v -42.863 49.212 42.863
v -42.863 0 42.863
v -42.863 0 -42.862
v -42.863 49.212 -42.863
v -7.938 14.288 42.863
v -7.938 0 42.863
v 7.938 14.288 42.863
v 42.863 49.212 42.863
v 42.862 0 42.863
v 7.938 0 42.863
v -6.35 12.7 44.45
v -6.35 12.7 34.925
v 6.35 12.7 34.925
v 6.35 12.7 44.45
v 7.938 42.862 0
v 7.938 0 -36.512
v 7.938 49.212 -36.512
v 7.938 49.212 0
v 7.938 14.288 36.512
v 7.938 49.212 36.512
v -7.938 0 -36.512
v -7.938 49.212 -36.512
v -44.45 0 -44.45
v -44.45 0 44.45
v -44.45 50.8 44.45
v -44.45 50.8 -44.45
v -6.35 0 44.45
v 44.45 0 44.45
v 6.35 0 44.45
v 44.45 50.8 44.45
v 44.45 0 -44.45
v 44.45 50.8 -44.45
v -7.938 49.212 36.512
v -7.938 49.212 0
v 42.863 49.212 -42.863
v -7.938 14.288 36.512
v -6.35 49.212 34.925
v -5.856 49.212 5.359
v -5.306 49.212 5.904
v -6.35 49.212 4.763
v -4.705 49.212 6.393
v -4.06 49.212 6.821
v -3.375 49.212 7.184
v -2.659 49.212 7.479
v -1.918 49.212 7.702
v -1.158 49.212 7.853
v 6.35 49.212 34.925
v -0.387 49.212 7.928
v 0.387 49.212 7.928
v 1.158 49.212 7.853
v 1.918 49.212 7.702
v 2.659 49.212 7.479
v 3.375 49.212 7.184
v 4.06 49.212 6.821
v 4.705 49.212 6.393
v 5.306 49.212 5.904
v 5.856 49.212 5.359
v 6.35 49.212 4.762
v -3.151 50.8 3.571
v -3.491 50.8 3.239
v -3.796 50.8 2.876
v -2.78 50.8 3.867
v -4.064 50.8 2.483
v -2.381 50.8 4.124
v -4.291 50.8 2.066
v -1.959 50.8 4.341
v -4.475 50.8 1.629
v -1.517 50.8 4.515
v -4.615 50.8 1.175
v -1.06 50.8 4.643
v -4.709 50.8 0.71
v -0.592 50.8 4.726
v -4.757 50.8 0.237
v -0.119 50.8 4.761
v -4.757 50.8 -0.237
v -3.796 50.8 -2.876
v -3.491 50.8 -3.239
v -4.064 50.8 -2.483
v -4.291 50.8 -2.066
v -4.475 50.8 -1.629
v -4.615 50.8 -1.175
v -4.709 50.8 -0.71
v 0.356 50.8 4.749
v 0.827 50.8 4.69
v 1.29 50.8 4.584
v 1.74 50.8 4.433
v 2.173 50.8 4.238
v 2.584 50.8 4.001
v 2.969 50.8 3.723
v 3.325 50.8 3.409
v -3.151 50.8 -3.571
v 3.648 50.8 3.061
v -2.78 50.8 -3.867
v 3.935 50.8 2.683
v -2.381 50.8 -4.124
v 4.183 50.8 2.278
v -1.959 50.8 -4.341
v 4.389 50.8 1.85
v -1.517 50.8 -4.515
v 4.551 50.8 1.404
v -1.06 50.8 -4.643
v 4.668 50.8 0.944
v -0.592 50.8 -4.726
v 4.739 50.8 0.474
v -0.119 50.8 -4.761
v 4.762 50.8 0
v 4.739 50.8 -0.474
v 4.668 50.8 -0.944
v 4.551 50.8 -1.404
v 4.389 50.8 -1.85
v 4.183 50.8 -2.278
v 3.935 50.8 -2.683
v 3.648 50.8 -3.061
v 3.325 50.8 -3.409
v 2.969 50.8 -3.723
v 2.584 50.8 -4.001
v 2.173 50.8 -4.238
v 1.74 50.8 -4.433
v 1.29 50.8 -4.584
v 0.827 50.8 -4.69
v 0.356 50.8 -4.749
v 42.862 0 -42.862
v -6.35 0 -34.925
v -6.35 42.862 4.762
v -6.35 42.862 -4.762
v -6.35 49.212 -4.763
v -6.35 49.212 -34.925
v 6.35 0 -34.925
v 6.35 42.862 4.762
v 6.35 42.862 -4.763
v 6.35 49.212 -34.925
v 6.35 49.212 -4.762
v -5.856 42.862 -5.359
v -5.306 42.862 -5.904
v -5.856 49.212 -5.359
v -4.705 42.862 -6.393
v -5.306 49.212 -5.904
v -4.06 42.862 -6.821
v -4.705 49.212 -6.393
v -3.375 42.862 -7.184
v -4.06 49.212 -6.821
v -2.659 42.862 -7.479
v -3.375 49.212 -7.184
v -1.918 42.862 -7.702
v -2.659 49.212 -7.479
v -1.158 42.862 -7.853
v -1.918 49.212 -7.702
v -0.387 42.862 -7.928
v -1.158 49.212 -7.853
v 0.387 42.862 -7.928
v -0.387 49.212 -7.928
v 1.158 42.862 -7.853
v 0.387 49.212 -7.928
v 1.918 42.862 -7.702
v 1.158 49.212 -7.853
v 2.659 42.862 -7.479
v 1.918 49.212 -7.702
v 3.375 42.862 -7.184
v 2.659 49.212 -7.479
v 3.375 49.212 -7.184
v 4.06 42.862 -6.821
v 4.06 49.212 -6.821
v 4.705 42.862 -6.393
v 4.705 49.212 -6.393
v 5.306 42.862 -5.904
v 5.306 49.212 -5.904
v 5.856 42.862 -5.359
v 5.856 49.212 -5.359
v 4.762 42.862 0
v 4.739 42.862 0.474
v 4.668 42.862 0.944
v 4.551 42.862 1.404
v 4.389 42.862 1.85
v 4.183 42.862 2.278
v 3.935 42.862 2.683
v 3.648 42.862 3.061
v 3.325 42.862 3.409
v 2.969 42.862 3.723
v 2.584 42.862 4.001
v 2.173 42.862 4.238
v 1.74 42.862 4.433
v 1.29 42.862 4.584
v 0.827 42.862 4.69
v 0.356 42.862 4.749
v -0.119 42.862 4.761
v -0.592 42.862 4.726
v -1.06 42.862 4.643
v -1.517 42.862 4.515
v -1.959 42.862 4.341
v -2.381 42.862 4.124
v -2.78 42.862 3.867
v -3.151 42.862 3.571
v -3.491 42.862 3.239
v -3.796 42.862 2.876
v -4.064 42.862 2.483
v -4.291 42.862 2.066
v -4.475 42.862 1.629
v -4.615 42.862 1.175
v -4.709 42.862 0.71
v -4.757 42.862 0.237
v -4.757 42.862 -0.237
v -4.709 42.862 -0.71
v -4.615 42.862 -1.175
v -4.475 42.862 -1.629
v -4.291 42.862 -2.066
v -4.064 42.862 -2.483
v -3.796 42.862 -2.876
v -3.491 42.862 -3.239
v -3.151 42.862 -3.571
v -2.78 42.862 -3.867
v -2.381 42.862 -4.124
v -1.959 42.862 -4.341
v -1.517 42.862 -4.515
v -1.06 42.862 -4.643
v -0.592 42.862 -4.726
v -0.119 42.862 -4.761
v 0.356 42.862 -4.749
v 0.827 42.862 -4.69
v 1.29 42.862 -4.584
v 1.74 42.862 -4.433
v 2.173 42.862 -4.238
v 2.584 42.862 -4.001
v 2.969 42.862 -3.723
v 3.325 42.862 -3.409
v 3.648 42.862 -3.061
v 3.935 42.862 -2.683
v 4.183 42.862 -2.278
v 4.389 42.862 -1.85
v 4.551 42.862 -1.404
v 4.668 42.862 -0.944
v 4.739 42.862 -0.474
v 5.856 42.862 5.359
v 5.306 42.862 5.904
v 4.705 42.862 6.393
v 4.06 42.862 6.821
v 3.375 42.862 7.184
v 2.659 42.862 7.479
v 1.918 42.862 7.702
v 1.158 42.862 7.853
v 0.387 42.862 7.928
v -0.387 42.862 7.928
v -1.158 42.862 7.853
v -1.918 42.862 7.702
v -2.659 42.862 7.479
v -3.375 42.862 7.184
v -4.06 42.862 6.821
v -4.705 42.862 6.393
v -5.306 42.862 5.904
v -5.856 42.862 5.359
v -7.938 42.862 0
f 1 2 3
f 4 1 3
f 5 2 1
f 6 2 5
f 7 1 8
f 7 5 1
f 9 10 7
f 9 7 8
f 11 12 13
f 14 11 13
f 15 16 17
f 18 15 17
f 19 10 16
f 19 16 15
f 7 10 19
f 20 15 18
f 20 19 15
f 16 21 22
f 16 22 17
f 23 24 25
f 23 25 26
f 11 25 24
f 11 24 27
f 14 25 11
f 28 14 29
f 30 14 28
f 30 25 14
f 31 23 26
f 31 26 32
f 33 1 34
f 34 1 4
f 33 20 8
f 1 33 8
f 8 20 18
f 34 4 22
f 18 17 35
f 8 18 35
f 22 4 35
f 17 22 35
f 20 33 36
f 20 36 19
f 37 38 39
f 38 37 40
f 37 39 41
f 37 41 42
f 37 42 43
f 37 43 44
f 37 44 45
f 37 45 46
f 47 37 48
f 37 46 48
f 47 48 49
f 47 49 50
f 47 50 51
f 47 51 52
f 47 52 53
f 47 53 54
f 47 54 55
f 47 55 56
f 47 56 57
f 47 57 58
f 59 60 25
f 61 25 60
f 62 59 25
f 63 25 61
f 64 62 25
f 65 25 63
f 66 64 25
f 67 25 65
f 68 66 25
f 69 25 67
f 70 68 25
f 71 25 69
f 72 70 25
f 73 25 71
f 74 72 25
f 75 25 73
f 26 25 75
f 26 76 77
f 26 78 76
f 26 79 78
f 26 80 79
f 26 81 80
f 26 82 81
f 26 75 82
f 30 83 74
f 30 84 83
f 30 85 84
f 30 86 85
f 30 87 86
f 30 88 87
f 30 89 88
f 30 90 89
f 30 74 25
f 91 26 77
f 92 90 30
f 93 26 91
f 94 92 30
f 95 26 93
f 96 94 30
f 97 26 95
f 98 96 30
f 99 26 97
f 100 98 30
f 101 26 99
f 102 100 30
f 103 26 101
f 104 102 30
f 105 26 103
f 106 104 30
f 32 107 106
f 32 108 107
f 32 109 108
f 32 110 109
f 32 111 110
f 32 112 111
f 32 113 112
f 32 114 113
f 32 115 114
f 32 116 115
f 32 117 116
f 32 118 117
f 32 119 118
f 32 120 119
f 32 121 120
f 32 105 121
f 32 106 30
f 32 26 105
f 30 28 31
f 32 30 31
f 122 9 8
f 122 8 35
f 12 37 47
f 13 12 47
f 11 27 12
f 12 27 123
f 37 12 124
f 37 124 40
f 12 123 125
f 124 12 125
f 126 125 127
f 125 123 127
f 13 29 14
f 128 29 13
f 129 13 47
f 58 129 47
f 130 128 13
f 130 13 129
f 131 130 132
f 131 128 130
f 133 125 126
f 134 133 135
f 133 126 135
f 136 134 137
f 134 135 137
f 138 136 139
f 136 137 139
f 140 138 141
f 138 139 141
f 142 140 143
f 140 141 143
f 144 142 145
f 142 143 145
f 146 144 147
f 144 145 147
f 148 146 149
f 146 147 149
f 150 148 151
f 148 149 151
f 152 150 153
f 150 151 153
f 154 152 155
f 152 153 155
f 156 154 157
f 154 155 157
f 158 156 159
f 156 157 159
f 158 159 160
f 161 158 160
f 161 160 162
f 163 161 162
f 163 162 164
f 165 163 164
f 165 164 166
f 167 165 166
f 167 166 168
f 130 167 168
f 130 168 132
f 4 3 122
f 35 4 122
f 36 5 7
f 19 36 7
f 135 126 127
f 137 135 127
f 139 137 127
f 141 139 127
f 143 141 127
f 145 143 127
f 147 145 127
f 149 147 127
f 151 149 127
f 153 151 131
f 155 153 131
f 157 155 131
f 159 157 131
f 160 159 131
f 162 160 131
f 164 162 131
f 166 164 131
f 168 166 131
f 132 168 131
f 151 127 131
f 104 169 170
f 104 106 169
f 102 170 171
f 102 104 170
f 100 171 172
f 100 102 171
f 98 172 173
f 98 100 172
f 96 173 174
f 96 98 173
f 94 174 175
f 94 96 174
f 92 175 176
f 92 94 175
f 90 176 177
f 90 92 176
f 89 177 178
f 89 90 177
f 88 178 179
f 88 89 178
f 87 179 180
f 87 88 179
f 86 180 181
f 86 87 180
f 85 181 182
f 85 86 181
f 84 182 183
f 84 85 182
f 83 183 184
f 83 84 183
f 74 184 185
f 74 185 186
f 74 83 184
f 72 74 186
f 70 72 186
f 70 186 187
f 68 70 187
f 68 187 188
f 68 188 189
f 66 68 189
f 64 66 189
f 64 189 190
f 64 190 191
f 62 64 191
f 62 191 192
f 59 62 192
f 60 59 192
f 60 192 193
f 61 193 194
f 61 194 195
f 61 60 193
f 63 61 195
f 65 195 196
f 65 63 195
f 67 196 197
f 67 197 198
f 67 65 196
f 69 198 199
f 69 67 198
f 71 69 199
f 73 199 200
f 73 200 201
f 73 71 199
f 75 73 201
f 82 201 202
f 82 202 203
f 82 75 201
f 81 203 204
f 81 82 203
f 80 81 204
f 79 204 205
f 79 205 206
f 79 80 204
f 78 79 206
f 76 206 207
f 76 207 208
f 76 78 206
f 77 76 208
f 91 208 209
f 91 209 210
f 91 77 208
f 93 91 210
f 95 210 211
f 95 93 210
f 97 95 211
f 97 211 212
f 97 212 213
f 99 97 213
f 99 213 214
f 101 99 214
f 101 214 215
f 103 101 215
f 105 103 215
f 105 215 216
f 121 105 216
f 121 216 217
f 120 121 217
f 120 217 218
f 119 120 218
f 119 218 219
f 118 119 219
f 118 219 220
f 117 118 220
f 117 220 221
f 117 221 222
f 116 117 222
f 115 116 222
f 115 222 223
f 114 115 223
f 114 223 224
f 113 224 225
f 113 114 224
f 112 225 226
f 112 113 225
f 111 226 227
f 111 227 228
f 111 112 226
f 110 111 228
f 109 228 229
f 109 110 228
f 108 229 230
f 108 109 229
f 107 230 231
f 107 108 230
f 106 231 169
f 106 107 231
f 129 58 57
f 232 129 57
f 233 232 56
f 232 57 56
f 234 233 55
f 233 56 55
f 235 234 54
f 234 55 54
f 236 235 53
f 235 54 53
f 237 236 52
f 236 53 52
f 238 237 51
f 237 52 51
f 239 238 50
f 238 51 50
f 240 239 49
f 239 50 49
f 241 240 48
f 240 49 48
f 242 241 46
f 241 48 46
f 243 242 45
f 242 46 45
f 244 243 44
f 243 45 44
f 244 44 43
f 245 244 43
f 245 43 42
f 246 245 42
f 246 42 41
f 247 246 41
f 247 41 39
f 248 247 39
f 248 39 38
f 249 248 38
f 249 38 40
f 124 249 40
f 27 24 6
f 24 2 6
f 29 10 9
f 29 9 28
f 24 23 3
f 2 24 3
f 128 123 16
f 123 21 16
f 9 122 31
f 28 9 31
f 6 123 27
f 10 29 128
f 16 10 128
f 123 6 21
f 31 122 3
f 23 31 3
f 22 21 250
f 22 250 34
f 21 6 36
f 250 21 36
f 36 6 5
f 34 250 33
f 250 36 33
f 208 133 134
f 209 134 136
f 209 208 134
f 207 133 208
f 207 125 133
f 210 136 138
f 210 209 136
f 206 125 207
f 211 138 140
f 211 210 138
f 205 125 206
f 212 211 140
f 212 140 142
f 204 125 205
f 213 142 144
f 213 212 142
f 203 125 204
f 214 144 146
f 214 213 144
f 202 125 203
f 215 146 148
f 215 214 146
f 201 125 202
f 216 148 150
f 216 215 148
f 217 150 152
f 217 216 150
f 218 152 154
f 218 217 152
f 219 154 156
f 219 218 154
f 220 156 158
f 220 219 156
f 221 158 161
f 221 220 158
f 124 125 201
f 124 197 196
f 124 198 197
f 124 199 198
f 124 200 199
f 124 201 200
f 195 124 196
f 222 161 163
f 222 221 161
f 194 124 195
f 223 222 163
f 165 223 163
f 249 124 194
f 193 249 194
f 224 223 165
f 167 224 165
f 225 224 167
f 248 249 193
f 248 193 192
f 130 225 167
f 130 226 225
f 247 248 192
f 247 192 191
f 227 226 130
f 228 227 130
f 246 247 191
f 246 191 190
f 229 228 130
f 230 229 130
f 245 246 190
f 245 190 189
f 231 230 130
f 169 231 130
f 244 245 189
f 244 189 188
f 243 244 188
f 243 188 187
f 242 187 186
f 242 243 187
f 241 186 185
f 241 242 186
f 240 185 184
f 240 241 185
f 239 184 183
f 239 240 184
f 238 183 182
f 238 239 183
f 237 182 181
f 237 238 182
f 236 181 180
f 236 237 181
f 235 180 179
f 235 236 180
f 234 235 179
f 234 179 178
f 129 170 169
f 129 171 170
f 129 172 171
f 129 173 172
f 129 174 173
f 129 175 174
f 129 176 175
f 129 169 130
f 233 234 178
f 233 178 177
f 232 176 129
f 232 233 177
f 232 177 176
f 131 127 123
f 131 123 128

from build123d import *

# Parameters (mm, degrees)
SKETCH1_W           = 88.9
SKETCH1_H           = 88.9
BOSS_EXTRUDE1_DEPTH = 50.8
SHELL1_T            = -1.5875
SKETCH4_R           = 4.7625
CUT_EXTRUDE3_DEPTH  = 51.8
SKETCH5_W           = 15.875
SKETCH5_H           = 73.025
SKETCH5_W_2         = 12.7
SKETCH5_H_2         = 69.85
EXTRUDE_THIN1_DEPTH = 49.2125
SKETCH10_R          = 7.9375
SKETCH10_R_2        = 4.7625
BOSS_EXTRUDE5_DEPTH = 6.35
SKETCH14_W          = 15.875
SKETCH14_H          = 14.2875
BOSS_EXTRUDE7_DEPTH = 7.9375
CUT_EXTRUDE6_START  = -9.525
SKETCH15_W          = 12.7
SKETCH15_H          = 12.7
CUT_EXTRUDE6_DEPTH  = 9.525


with BuildPart() as part:
    # Sketch1 → Boss-Extrude1 (new body)
    with BuildSketch(Plane(origin=(0, 0, 0), x_dir=(1, 0, 0), z_dir=(0, 1, 0))):
        Rectangle(SKETCH1_W, SKETCH1_H)
    extrude(amount=BOSS_EXTRUDE1_DEPTH)

    # Shell1
    shell1_openings = [part.faces().sort_by_distance(p)[0] for p in [
        (0, 0, 0),
    ]]
    offset(amount=SHELL1_T, openings=shell1_openings, kind=Kind.INTERSECTION)

    # Sketch4 → Cut-Extrude3 (cut, through all)
    with BuildSketch(Plane(origin=(0, 50.8, 0), x_dir=(1, 0, 0), z_dir=(0, 1, 0))):
        Circle(SKETCH4_R)
    extrude(amount=-CUT_EXTRUDE3_DEPTH, mode=Mode.SUBTRACT)

    # Sketch5 → Extrude-Thin1 (add)
    with BuildSketch(Plane.XZ.offset(-49.2125)):
        Rectangle(SKETCH5_W, SKETCH5_H)
        Rectangle(SKETCH5_W_2, SKETCH5_H_2, mode=Mode.SUBTRACT)
    extrude(amount=EXTRUDE_THIN1_DEPTH)

    # Sketch10 → Boss-Extrude5 (add)
    with BuildSketch(Plane.XZ.offset(-49.2125)):
        Circle(SKETCH10_R)
        Circle(SKETCH10_R_2, mode=Mode.SUBTRACT)
    extrude(amount=BOSS_EXTRUDE5_DEPTH)

    # Sketch14 → Boss-Extrude7 (add)
    with BuildSketch(Plane.XY.offset(44.45)):
        with Locations((0, 7.14375)):
            Rectangle(SKETCH14_W, SKETCH14_H)
    extrude(amount=-BOSS_EXTRUDE7_DEPTH)

    # Sketch15 → Cut-Extrude6 (cut)
    with BuildSketch(Plane.XY.offset(44.45).offset(CUT_EXTRUDE6_START)):
        with Locations((0, 6.35)):
            Rectangle(SKETCH15_W, SKETCH15_H)
    extrude(amount=CUT_EXTRUDE6_DEPTH, mode=Mode.SUBTRACT)


solid = part.part
